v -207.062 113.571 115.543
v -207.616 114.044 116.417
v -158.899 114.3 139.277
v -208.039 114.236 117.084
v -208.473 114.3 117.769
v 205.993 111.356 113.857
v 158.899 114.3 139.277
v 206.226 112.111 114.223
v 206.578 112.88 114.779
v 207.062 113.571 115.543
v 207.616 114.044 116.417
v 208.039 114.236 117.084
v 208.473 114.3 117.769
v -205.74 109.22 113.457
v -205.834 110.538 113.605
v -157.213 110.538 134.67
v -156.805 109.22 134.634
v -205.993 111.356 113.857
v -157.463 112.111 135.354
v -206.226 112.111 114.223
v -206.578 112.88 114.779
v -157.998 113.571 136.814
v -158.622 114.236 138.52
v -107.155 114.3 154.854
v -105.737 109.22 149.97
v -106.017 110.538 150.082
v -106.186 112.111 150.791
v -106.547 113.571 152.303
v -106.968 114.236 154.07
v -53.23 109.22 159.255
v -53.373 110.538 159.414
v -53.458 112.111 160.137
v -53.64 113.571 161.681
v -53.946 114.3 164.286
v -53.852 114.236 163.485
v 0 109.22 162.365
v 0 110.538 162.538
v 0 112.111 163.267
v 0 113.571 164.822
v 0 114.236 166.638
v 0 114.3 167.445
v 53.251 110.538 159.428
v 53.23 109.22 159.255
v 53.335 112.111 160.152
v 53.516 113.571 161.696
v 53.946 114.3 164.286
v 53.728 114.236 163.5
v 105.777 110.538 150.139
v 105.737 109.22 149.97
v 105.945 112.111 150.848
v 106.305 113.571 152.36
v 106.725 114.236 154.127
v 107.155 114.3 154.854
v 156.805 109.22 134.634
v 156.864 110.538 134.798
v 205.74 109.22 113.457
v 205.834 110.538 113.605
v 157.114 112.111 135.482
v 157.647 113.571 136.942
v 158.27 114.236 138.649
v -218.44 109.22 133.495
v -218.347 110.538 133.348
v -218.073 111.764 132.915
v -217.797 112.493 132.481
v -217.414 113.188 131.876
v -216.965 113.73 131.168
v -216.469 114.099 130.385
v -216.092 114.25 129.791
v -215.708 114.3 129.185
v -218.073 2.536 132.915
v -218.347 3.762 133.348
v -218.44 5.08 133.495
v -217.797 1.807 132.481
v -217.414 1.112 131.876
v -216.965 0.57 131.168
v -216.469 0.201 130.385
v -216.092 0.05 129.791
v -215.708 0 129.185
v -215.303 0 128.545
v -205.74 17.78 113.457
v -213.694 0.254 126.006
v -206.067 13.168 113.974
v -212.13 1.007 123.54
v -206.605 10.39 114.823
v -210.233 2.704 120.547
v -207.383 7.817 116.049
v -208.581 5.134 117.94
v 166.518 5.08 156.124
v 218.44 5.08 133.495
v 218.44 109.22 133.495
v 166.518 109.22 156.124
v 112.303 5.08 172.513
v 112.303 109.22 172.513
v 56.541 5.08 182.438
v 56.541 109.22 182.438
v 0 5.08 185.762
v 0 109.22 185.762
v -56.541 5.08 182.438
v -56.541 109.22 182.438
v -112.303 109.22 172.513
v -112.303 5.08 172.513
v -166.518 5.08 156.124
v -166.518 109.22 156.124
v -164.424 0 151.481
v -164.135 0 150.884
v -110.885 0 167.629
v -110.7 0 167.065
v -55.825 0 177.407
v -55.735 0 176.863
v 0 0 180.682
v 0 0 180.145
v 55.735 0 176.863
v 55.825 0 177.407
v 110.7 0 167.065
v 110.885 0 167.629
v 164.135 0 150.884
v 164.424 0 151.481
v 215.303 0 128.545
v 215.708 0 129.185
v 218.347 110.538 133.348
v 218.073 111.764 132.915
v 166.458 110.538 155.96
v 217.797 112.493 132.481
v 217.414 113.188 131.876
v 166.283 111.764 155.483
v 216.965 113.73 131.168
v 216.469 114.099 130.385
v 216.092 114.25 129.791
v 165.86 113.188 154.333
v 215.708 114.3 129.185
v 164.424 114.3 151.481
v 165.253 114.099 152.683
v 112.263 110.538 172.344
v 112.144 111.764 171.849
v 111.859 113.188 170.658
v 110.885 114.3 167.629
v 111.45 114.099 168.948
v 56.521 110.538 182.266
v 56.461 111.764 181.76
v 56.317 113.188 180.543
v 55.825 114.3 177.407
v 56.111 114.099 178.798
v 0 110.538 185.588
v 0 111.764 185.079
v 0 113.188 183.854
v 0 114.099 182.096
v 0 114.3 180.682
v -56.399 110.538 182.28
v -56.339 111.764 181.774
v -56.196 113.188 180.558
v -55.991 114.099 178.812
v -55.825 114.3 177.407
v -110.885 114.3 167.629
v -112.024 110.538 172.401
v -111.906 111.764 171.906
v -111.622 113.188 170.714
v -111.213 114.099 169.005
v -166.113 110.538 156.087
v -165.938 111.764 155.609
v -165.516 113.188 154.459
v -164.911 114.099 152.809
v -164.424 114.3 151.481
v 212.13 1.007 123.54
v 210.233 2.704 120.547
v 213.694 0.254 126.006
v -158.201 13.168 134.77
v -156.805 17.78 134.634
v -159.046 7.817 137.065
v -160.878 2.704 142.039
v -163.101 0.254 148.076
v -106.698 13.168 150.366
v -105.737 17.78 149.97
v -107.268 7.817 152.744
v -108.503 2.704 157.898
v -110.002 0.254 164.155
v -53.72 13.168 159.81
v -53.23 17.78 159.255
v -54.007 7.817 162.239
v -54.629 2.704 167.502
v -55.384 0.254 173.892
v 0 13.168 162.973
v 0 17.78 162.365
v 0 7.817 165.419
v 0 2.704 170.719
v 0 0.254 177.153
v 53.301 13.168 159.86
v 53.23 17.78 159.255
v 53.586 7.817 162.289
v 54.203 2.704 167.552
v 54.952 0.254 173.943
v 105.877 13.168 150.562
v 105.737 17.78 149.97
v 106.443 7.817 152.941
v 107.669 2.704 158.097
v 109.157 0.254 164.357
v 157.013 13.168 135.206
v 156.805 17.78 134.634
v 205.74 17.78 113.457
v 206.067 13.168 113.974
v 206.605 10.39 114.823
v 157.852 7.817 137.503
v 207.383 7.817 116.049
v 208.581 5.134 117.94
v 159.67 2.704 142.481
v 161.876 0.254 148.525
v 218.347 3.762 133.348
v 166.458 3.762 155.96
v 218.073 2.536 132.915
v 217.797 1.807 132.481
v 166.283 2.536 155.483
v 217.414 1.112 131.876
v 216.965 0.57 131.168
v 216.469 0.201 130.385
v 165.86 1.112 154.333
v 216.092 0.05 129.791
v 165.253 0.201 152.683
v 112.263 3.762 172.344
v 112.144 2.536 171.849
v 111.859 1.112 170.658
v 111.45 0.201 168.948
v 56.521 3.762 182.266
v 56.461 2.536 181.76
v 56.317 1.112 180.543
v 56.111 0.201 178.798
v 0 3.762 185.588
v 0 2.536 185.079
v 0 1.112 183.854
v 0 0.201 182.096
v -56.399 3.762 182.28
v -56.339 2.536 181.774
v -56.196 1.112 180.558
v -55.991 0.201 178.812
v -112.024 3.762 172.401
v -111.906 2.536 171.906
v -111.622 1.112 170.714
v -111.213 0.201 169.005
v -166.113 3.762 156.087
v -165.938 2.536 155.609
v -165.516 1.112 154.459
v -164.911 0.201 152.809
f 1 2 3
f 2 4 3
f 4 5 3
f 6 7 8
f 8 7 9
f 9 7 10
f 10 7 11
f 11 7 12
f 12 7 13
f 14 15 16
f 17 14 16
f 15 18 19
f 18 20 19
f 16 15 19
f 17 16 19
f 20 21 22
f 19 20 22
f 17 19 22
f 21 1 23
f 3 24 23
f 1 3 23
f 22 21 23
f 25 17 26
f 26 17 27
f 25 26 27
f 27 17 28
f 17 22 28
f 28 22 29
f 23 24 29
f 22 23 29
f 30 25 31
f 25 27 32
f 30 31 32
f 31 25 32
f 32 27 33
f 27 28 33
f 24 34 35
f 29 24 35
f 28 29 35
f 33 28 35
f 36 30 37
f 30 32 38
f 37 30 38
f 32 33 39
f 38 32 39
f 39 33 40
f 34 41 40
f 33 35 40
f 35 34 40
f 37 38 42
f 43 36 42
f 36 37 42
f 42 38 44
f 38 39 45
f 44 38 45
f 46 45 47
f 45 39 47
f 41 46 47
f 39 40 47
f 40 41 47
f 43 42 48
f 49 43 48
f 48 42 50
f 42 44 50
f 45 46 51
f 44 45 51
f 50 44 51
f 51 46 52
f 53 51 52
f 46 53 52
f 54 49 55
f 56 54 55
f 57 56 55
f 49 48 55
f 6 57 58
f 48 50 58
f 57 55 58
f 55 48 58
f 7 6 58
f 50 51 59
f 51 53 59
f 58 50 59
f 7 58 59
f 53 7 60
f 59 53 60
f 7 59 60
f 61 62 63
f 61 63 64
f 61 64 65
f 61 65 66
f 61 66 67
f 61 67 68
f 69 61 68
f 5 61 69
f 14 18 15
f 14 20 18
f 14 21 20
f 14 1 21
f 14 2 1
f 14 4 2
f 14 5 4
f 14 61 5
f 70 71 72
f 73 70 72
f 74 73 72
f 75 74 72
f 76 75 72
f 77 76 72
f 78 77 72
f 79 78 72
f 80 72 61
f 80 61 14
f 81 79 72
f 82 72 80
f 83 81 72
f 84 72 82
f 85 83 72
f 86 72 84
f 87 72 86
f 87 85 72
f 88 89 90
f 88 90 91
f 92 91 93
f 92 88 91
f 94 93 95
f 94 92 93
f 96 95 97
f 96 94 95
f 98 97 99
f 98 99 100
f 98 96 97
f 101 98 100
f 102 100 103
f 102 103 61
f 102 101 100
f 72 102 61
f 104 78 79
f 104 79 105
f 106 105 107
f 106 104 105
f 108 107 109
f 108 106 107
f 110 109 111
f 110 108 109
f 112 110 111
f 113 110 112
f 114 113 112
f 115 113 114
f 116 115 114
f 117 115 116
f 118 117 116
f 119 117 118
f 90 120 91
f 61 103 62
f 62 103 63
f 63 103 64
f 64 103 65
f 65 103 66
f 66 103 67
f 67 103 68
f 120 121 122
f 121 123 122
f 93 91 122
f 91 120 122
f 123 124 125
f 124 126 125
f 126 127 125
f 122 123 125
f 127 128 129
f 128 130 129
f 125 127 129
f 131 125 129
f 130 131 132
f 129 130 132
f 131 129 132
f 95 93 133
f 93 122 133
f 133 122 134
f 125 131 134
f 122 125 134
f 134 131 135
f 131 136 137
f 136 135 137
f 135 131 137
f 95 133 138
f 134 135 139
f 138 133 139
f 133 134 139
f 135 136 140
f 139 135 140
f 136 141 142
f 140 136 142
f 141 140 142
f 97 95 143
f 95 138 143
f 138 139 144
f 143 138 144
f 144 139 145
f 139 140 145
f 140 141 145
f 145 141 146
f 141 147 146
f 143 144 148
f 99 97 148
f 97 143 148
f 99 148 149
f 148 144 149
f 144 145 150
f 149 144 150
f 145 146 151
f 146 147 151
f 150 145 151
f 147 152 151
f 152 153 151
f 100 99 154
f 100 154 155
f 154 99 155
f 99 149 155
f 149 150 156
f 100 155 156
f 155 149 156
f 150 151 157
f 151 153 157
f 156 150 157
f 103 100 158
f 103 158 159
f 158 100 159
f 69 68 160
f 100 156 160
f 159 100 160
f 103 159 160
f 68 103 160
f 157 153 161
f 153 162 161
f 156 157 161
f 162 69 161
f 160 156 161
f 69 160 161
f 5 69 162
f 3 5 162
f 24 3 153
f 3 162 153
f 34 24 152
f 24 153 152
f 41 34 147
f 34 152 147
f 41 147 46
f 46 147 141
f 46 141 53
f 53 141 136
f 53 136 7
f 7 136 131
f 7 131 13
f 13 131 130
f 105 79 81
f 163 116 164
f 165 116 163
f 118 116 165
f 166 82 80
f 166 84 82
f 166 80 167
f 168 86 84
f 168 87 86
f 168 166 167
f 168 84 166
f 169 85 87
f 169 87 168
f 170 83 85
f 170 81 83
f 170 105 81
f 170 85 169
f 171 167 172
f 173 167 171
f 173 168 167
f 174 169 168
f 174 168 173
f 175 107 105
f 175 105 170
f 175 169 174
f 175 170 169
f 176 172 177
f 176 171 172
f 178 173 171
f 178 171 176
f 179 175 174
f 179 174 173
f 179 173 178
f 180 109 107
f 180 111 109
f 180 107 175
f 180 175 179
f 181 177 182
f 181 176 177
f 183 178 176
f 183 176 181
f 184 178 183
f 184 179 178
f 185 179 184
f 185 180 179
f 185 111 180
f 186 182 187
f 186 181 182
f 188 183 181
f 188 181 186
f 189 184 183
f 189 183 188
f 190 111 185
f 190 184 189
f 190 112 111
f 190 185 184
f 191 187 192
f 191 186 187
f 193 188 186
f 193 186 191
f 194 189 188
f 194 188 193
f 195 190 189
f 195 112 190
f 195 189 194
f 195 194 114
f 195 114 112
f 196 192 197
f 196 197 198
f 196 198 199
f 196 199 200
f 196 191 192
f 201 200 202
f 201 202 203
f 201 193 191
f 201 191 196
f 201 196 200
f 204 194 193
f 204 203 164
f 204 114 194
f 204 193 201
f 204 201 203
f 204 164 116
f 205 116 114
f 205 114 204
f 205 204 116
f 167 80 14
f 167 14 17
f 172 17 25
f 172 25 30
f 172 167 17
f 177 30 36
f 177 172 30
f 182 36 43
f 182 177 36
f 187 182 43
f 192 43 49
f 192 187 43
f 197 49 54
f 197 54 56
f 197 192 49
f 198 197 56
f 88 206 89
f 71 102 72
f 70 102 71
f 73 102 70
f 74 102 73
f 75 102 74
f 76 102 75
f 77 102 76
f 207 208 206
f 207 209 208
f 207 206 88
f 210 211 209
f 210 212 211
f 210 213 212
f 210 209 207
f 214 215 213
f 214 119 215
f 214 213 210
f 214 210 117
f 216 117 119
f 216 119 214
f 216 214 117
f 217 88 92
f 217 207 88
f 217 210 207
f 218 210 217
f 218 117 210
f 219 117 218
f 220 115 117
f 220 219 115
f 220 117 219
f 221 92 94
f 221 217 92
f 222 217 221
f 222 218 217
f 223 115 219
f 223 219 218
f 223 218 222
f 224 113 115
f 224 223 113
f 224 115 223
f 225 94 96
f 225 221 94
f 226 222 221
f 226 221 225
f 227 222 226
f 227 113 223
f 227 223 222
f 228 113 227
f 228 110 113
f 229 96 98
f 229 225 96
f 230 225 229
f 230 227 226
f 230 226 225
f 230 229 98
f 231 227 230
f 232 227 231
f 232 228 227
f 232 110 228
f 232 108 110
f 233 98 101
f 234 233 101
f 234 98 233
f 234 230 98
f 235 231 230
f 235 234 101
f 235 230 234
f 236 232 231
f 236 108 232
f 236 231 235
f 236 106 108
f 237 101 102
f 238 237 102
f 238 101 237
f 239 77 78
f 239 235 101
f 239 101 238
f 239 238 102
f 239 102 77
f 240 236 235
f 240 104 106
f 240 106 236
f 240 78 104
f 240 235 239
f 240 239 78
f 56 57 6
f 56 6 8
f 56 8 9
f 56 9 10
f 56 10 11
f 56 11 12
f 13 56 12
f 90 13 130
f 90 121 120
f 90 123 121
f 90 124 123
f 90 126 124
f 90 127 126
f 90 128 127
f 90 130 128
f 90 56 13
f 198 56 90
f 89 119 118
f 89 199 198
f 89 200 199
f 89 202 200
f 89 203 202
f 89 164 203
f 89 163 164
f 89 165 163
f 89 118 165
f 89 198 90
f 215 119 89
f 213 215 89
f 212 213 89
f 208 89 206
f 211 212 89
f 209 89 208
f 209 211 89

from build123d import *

# Parameters (mm, degrees)
F1_DEPTH = 114.3
F2_R     = 5.08
F3_R     = 17.78


with BuildPart() as f1:
    # F0 (on Front) → F1 (new body)
    with BuildSketch(Plane.XZ):
        with BuildLine():
            ThreePointArc((218.44, 133.495064), (0, 185.76179), (-218.44, 133.495064))
            Line((-218.44, 133.495064), (-205.74, 113.457282))
            ThreePointArc((-205.74, 113.457282), (0, 162.364627), (205.74, 113.457282))
            Line((205.74, 113.457282), (218.44, 133.495064))
        make_face()
    extrude(amount=-F1_DEPTH)

    # F2
    f2_edges = [f1.edges().sort_by_distance(p)[0] for p in [
        (0, 0, 185.76179),
        (0, 114.3, 162.364627),
        (0, 114.3, 185.76179),
    ]]
    fillet(f2_edges, radius=F2_R)

    # F3
    f3_edges = [f1.edges().sort_by_distance(p)[0] for p in [
        (0, 0, 162.364627),
    ]]
    fillet(f3_edges, radius=F3_R)


solid = f1.part
